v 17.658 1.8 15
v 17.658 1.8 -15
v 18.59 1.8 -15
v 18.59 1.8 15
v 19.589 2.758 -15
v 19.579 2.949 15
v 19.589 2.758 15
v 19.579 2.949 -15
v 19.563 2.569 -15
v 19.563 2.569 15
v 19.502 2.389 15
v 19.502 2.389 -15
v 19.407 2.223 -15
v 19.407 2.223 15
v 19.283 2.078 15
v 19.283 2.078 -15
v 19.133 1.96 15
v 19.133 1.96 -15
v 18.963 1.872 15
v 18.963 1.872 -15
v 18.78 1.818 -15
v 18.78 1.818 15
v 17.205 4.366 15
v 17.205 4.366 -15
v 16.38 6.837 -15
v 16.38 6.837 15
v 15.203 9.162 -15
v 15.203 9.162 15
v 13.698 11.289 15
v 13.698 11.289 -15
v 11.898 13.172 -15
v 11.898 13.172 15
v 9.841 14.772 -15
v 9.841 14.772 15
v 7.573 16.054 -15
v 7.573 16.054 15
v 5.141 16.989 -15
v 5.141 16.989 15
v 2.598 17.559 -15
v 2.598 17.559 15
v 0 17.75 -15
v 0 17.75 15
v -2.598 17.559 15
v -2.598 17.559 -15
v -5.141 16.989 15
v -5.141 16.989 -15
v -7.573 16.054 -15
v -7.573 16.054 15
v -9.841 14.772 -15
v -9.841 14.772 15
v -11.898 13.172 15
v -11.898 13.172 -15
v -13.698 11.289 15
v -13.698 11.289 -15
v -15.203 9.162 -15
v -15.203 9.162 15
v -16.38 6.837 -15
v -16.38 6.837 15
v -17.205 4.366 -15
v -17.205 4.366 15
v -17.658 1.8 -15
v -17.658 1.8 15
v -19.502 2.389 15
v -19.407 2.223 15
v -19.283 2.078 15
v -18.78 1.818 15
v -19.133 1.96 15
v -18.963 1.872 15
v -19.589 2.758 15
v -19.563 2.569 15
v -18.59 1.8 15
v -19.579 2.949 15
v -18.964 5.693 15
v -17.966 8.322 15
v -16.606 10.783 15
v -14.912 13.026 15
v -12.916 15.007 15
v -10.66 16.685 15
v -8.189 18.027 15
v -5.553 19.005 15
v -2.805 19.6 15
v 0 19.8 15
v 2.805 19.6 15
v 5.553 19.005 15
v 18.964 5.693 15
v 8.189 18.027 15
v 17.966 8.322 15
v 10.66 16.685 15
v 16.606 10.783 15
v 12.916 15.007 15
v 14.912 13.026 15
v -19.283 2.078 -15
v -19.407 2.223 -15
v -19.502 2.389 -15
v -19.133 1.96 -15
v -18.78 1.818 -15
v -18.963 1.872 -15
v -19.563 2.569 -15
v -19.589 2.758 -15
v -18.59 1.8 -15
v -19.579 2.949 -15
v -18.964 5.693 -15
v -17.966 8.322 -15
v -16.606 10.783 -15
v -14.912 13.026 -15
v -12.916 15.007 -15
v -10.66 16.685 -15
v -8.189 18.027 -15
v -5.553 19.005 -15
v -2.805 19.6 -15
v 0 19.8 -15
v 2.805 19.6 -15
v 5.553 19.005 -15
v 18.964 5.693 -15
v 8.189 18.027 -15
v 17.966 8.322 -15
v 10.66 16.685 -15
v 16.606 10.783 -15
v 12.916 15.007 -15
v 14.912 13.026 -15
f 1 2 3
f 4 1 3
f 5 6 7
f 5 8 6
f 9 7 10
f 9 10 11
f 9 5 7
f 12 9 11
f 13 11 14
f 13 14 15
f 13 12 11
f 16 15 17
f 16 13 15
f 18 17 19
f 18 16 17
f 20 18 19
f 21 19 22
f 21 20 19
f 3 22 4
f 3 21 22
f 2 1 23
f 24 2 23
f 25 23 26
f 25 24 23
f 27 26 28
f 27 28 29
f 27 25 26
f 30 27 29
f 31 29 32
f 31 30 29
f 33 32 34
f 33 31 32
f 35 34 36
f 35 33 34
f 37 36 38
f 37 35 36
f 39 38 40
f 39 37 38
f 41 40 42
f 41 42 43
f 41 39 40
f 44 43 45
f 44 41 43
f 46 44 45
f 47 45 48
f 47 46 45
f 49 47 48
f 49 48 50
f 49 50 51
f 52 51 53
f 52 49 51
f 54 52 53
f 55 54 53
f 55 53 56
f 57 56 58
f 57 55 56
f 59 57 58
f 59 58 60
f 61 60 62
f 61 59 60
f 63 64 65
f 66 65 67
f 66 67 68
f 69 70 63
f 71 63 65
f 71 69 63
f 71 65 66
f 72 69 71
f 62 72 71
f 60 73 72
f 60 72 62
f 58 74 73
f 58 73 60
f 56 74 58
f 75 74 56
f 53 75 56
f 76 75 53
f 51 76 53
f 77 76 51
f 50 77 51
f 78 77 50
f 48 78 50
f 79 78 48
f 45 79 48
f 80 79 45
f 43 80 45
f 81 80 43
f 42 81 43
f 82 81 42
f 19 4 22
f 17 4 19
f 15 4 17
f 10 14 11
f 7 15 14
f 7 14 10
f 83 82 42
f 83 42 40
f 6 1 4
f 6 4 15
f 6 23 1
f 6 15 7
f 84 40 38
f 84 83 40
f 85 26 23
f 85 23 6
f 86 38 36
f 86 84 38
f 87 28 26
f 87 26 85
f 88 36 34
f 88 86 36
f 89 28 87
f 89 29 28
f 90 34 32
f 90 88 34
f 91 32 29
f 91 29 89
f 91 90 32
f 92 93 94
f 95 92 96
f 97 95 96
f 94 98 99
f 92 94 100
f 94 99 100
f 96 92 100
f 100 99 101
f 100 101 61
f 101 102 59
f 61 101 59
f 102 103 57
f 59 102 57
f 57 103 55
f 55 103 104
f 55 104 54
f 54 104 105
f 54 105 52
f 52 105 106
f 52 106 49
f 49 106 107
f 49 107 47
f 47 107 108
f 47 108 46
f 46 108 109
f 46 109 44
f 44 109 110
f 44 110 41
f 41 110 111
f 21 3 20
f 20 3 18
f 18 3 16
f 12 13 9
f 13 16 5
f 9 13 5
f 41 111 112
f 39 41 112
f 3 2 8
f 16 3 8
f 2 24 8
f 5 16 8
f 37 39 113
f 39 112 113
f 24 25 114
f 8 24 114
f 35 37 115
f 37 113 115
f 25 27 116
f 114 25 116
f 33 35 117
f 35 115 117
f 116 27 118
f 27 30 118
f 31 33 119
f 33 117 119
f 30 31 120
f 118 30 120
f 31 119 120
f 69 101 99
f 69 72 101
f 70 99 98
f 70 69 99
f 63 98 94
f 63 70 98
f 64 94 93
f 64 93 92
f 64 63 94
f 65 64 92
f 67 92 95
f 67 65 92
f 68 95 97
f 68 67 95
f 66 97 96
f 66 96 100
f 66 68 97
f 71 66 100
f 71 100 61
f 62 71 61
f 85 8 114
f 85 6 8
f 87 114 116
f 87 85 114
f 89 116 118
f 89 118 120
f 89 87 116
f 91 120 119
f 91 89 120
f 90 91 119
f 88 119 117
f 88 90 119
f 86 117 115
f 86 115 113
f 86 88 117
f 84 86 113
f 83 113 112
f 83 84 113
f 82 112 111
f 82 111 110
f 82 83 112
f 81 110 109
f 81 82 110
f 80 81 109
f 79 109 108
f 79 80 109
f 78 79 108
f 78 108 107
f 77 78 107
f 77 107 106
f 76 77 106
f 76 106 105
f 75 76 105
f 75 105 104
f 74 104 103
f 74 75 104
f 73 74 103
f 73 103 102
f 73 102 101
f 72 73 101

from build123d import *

# Parameters (mm, degrees)
SKETCH053_R          = 19.8
SKETCH053_R_2        = 17.75
PAD020_DEPTH         = 15
SKETCH054_W          = 40
SKETCH054_H          = 22
POCKET033_DEPTH      = 15.001
POCKET033_DEPTH_BACK = 15.001
FILLET009_R          = 1


with BuildPart() as part:
    # Sketch053 → Pad020 (new body, symmetric)
    with BuildSketch(Plane.XY):
        Circle(SKETCH053_R)
        Circle(SKETCH053_R_2, mode=Mode.SUBTRACT)
    extrude(amount=PAD020_DEPTH, both=True)

    # Sketch054 → Pocket033 (cut, two sides)
    with BuildSketch(Plane.XY) as pocket033_sk:
        with Locations((0, -9.2)):
            Rectangle(SKETCH054_W, SKETCH054_H)
    extrude(amount=-POCKET033_DEPTH, mode=Mode.SUBTRACT)
    extrude(pocket033_sk.sketch, amount=POCKET033_DEPTH_BACK, mode=Mode.SUBTRACT)

    # Fillet009
    fillet009_edges = [part.edges().sort_by_distance(p)[0] for p in [
        (-19.718012, 1.8, 0),
        (19.718012, 1.8, 0),
    ]]
    fillet(fillet009_edges, radius=FILLET009_R)


solid = part.part
